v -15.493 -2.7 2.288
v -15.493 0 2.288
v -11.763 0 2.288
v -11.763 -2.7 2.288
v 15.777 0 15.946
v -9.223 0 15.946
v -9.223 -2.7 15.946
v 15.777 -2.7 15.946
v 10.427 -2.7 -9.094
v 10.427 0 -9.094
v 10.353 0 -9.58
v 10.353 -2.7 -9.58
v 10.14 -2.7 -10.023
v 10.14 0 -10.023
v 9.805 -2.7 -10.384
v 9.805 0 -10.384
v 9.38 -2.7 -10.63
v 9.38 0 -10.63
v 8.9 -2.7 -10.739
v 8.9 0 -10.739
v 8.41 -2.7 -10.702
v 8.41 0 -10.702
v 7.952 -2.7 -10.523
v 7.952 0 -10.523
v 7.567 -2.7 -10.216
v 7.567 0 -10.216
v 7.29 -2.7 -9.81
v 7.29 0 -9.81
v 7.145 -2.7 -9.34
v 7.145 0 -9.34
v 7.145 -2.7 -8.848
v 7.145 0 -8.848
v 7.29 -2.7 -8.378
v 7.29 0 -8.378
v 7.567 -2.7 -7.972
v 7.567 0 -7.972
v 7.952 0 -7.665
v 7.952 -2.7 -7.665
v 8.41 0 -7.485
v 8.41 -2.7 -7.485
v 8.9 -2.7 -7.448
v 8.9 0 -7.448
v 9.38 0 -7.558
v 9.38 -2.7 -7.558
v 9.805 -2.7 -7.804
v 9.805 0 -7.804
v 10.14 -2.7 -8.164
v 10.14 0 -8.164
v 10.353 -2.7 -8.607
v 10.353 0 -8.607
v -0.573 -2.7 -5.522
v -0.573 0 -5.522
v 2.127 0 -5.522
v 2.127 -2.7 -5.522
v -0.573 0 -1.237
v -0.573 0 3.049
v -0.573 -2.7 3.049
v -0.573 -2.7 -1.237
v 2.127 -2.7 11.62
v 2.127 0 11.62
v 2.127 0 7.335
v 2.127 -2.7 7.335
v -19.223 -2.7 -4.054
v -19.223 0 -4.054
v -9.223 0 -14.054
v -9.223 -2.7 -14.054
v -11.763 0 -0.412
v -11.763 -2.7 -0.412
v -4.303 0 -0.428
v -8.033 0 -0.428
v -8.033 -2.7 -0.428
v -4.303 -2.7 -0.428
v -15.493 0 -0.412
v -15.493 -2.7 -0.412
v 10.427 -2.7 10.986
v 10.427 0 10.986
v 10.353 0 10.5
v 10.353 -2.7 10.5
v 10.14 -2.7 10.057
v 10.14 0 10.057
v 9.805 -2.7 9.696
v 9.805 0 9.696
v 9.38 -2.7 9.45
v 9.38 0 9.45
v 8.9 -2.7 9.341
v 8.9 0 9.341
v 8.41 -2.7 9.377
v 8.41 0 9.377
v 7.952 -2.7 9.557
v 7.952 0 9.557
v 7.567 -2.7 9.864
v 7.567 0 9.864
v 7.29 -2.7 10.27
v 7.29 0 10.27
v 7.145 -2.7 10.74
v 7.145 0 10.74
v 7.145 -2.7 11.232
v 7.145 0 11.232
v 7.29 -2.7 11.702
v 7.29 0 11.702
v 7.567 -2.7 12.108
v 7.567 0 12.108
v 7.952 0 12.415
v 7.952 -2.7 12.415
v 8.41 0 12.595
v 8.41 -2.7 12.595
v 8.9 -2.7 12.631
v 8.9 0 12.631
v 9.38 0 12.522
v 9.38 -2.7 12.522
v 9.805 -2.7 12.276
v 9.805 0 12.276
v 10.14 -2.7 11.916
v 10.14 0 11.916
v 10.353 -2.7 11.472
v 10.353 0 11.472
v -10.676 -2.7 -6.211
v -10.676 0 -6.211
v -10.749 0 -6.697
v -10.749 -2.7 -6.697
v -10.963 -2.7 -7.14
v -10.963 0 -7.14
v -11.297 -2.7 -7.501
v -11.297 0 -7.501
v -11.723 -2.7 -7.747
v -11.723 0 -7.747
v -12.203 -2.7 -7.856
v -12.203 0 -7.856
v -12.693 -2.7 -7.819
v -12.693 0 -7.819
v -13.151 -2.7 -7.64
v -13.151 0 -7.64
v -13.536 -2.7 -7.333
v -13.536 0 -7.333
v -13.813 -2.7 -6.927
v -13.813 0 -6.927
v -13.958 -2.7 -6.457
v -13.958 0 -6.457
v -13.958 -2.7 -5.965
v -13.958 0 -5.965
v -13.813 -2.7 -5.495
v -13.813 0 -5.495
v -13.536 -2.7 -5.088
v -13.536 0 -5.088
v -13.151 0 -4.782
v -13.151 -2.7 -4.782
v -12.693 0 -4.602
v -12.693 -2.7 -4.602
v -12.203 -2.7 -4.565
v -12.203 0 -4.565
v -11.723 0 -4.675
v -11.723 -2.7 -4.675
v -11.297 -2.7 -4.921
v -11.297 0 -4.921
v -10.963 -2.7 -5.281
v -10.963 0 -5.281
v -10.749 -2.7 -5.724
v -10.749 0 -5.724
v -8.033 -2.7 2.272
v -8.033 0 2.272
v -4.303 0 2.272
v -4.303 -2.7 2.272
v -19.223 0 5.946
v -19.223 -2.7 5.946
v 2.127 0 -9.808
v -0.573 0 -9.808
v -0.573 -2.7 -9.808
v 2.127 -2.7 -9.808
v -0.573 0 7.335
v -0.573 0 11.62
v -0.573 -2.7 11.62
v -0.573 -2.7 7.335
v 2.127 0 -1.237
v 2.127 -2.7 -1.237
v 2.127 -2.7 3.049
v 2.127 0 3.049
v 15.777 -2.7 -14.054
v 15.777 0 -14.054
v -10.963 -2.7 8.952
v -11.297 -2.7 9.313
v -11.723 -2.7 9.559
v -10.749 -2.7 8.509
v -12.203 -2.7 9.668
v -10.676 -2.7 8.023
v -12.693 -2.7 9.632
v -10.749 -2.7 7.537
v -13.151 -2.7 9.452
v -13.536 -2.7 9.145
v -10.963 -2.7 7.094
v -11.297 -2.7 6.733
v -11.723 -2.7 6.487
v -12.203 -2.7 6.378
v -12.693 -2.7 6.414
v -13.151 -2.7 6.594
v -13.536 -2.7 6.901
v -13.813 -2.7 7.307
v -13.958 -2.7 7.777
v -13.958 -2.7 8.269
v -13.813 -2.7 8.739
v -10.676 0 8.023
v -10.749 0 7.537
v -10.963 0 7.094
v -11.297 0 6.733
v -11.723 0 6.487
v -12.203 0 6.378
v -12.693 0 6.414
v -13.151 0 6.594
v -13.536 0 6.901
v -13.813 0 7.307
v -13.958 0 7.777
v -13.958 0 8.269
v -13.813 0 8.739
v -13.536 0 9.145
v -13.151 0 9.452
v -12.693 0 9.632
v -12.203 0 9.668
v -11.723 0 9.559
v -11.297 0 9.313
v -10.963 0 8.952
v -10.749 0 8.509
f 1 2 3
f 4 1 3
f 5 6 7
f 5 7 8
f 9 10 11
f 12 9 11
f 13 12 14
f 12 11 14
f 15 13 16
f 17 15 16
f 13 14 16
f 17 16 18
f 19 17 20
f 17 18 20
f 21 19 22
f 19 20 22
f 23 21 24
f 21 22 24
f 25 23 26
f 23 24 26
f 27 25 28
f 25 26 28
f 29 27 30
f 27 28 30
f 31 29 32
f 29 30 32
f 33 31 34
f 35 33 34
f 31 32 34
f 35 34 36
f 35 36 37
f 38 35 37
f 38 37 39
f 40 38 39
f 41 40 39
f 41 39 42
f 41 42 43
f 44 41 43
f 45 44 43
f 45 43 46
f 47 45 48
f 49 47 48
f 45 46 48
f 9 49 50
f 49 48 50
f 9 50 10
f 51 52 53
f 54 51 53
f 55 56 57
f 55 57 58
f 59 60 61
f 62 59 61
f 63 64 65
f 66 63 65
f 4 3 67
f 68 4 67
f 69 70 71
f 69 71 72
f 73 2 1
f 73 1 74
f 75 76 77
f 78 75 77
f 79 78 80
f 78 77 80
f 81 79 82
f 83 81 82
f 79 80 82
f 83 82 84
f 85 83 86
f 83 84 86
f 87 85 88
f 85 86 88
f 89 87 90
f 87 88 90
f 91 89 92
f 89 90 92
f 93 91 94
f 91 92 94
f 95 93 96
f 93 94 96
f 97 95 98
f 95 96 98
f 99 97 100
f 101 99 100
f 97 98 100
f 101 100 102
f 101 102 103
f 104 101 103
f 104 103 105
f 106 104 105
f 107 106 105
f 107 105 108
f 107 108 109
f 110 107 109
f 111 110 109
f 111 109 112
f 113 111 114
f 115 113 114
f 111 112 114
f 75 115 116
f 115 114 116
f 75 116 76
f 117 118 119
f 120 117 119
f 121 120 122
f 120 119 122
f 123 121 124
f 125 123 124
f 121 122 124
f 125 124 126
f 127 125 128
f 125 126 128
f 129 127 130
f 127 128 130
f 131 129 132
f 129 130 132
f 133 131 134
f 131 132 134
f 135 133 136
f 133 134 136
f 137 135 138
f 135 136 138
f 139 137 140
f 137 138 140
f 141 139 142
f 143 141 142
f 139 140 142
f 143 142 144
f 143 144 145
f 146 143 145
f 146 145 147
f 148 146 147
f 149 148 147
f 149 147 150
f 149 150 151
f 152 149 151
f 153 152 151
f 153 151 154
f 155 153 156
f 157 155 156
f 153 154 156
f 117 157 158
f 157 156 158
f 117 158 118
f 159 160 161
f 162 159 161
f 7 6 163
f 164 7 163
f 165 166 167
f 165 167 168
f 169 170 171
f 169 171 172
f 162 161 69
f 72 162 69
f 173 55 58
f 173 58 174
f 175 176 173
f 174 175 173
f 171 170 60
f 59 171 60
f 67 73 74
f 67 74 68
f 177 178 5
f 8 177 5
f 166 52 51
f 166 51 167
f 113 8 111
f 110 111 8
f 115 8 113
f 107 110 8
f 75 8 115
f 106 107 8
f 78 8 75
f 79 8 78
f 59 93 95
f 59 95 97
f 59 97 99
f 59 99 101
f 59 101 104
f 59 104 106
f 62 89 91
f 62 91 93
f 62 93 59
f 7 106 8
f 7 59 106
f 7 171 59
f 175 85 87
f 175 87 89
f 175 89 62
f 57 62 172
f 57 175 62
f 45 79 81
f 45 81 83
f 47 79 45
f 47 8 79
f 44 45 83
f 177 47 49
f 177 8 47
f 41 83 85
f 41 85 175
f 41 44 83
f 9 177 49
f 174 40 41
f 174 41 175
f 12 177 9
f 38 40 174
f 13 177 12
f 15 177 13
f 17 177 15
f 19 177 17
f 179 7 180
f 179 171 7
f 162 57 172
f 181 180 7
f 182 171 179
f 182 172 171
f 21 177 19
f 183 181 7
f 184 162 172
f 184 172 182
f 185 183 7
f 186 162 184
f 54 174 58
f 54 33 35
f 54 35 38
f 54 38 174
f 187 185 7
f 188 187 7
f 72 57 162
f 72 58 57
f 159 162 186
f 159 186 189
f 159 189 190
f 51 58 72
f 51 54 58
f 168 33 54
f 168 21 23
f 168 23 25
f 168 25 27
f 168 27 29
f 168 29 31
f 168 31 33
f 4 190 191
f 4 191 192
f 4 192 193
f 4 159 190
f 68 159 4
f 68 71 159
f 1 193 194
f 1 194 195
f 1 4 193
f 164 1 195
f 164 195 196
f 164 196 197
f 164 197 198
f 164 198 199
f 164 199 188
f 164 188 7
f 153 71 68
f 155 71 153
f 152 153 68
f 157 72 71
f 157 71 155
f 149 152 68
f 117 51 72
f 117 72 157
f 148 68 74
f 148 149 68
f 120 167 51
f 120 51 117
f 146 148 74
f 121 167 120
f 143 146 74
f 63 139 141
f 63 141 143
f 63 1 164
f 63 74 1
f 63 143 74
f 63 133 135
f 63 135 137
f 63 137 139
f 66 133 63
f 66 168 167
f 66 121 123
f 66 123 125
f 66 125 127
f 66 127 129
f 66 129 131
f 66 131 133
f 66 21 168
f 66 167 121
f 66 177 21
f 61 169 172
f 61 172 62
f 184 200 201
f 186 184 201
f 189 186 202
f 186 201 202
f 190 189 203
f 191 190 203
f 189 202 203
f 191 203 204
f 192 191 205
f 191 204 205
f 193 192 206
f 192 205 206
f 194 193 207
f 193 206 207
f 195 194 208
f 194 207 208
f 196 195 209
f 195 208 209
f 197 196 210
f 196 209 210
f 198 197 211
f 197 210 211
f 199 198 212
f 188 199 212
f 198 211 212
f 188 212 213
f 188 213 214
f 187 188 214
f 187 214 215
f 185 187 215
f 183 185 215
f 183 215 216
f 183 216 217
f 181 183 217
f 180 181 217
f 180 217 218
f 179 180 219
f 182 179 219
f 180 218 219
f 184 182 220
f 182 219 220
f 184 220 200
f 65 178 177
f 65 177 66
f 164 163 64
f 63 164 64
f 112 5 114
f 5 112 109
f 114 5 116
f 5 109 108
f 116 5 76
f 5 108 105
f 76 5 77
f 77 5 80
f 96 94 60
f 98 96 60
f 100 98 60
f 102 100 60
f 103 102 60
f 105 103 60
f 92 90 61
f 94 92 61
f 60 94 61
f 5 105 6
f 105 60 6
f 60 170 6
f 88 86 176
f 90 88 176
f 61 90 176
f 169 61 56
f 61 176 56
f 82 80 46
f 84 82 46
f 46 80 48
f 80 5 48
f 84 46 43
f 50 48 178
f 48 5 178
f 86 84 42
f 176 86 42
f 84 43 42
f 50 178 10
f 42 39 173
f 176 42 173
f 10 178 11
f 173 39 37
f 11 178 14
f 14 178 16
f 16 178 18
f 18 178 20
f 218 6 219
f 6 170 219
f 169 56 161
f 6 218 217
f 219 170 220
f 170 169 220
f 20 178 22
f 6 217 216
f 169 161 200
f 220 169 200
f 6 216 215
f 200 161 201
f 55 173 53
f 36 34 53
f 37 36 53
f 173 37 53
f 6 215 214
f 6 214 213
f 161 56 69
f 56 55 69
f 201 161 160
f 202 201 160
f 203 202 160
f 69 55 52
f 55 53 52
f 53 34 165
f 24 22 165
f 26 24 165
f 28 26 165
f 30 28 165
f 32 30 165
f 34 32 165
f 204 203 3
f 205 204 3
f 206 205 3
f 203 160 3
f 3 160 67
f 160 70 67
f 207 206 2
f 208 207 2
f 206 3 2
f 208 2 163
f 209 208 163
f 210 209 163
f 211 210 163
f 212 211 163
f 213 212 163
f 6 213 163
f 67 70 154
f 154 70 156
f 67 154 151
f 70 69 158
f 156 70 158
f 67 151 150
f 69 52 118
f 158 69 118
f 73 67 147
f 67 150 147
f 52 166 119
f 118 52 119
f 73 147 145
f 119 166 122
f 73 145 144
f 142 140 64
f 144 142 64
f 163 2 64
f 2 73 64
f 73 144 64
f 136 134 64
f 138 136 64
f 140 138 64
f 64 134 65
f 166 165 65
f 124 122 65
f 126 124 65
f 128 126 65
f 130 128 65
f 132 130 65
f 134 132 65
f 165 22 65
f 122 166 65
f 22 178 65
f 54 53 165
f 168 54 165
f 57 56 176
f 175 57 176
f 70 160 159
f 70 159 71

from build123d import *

# Parameters (mm, degrees)
SKETCH1_R           = 1.65
SKETCH1_W           = 2.7
SKETCH1_H           = 4.285714286
SKETCH1_H_2         = 4.285714285
SKETCH1_W_2         = 3.73
SKETCH1_H_3         = 2.7
BOSS_EXTRUDE1_DEPTH = 2.7


with BuildPart() as part:
    # Sketch1 → Boss-Extrude1 (new body)
    with BuildSketch(Plane(origin=(0, 0, 0), x_dir=(1, 0, 0), z_dir=(0, 1, 0))):
        Polygon((10.776704041, -15.946127132), (-9.223295959, -15.946127132), (-19.223295959, -5.946127132), (-19.223295959, 4.053872868), (-9.223295959, 14.053872868), (10.776704041, 14.053872868), (15.776704041, 14.053872868), (15.776704041, -15.946127132), align=None)
        with Locations((-12.32618077, -8.023001304)):
            Circle(SKETCH1_R, mode=Mode.SUBTRACT)
        with Locations((8.776704041, 9.093845285)):
            Circle(SKETCH1_R, mode=Mode.SUBTRACT)
        with Locations((-12.32618077, 6.210691875)):
            Circle(SKETCH1_R, mode=Mode.SUBTRACT)
        with Locations((8.776704041, -10.98609955)):
            Circle(SKETCH1_R, mode=Mode.SUBTRACT)
        with Locations((0.776704041, -9.477583286)):
            Rectangle(SKETCH1_W, SKETCH1_H, mode=Mode.SUBTRACT)
        with Locations((0.776704041, -0.906154715)):
            Rectangle(SKETCH1_W, SKETCH1_H, mode=Mode.SUBTRACT)
        with Locations((0.776704041, 7.665273857)):
            Rectangle(SKETCH1_W, SKETCH1_H_2, mode=Mode.SUBTRACT)
        with Locations((-13.628295959, -0.938132649)):
            Rectangle(SKETCH1_W_2, SKETCH1_H_3, mode=Mode.SUBTRACT)
        with Locations((-6.168295959, -0.922143682)):
            Rectangle(SKETCH1_W_2, SKETCH1_H_3, mode=Mode.SUBTRACT)
    extrude(amount=-BOSS_EXTRUDE1_DEPTH)


solid = part.part
